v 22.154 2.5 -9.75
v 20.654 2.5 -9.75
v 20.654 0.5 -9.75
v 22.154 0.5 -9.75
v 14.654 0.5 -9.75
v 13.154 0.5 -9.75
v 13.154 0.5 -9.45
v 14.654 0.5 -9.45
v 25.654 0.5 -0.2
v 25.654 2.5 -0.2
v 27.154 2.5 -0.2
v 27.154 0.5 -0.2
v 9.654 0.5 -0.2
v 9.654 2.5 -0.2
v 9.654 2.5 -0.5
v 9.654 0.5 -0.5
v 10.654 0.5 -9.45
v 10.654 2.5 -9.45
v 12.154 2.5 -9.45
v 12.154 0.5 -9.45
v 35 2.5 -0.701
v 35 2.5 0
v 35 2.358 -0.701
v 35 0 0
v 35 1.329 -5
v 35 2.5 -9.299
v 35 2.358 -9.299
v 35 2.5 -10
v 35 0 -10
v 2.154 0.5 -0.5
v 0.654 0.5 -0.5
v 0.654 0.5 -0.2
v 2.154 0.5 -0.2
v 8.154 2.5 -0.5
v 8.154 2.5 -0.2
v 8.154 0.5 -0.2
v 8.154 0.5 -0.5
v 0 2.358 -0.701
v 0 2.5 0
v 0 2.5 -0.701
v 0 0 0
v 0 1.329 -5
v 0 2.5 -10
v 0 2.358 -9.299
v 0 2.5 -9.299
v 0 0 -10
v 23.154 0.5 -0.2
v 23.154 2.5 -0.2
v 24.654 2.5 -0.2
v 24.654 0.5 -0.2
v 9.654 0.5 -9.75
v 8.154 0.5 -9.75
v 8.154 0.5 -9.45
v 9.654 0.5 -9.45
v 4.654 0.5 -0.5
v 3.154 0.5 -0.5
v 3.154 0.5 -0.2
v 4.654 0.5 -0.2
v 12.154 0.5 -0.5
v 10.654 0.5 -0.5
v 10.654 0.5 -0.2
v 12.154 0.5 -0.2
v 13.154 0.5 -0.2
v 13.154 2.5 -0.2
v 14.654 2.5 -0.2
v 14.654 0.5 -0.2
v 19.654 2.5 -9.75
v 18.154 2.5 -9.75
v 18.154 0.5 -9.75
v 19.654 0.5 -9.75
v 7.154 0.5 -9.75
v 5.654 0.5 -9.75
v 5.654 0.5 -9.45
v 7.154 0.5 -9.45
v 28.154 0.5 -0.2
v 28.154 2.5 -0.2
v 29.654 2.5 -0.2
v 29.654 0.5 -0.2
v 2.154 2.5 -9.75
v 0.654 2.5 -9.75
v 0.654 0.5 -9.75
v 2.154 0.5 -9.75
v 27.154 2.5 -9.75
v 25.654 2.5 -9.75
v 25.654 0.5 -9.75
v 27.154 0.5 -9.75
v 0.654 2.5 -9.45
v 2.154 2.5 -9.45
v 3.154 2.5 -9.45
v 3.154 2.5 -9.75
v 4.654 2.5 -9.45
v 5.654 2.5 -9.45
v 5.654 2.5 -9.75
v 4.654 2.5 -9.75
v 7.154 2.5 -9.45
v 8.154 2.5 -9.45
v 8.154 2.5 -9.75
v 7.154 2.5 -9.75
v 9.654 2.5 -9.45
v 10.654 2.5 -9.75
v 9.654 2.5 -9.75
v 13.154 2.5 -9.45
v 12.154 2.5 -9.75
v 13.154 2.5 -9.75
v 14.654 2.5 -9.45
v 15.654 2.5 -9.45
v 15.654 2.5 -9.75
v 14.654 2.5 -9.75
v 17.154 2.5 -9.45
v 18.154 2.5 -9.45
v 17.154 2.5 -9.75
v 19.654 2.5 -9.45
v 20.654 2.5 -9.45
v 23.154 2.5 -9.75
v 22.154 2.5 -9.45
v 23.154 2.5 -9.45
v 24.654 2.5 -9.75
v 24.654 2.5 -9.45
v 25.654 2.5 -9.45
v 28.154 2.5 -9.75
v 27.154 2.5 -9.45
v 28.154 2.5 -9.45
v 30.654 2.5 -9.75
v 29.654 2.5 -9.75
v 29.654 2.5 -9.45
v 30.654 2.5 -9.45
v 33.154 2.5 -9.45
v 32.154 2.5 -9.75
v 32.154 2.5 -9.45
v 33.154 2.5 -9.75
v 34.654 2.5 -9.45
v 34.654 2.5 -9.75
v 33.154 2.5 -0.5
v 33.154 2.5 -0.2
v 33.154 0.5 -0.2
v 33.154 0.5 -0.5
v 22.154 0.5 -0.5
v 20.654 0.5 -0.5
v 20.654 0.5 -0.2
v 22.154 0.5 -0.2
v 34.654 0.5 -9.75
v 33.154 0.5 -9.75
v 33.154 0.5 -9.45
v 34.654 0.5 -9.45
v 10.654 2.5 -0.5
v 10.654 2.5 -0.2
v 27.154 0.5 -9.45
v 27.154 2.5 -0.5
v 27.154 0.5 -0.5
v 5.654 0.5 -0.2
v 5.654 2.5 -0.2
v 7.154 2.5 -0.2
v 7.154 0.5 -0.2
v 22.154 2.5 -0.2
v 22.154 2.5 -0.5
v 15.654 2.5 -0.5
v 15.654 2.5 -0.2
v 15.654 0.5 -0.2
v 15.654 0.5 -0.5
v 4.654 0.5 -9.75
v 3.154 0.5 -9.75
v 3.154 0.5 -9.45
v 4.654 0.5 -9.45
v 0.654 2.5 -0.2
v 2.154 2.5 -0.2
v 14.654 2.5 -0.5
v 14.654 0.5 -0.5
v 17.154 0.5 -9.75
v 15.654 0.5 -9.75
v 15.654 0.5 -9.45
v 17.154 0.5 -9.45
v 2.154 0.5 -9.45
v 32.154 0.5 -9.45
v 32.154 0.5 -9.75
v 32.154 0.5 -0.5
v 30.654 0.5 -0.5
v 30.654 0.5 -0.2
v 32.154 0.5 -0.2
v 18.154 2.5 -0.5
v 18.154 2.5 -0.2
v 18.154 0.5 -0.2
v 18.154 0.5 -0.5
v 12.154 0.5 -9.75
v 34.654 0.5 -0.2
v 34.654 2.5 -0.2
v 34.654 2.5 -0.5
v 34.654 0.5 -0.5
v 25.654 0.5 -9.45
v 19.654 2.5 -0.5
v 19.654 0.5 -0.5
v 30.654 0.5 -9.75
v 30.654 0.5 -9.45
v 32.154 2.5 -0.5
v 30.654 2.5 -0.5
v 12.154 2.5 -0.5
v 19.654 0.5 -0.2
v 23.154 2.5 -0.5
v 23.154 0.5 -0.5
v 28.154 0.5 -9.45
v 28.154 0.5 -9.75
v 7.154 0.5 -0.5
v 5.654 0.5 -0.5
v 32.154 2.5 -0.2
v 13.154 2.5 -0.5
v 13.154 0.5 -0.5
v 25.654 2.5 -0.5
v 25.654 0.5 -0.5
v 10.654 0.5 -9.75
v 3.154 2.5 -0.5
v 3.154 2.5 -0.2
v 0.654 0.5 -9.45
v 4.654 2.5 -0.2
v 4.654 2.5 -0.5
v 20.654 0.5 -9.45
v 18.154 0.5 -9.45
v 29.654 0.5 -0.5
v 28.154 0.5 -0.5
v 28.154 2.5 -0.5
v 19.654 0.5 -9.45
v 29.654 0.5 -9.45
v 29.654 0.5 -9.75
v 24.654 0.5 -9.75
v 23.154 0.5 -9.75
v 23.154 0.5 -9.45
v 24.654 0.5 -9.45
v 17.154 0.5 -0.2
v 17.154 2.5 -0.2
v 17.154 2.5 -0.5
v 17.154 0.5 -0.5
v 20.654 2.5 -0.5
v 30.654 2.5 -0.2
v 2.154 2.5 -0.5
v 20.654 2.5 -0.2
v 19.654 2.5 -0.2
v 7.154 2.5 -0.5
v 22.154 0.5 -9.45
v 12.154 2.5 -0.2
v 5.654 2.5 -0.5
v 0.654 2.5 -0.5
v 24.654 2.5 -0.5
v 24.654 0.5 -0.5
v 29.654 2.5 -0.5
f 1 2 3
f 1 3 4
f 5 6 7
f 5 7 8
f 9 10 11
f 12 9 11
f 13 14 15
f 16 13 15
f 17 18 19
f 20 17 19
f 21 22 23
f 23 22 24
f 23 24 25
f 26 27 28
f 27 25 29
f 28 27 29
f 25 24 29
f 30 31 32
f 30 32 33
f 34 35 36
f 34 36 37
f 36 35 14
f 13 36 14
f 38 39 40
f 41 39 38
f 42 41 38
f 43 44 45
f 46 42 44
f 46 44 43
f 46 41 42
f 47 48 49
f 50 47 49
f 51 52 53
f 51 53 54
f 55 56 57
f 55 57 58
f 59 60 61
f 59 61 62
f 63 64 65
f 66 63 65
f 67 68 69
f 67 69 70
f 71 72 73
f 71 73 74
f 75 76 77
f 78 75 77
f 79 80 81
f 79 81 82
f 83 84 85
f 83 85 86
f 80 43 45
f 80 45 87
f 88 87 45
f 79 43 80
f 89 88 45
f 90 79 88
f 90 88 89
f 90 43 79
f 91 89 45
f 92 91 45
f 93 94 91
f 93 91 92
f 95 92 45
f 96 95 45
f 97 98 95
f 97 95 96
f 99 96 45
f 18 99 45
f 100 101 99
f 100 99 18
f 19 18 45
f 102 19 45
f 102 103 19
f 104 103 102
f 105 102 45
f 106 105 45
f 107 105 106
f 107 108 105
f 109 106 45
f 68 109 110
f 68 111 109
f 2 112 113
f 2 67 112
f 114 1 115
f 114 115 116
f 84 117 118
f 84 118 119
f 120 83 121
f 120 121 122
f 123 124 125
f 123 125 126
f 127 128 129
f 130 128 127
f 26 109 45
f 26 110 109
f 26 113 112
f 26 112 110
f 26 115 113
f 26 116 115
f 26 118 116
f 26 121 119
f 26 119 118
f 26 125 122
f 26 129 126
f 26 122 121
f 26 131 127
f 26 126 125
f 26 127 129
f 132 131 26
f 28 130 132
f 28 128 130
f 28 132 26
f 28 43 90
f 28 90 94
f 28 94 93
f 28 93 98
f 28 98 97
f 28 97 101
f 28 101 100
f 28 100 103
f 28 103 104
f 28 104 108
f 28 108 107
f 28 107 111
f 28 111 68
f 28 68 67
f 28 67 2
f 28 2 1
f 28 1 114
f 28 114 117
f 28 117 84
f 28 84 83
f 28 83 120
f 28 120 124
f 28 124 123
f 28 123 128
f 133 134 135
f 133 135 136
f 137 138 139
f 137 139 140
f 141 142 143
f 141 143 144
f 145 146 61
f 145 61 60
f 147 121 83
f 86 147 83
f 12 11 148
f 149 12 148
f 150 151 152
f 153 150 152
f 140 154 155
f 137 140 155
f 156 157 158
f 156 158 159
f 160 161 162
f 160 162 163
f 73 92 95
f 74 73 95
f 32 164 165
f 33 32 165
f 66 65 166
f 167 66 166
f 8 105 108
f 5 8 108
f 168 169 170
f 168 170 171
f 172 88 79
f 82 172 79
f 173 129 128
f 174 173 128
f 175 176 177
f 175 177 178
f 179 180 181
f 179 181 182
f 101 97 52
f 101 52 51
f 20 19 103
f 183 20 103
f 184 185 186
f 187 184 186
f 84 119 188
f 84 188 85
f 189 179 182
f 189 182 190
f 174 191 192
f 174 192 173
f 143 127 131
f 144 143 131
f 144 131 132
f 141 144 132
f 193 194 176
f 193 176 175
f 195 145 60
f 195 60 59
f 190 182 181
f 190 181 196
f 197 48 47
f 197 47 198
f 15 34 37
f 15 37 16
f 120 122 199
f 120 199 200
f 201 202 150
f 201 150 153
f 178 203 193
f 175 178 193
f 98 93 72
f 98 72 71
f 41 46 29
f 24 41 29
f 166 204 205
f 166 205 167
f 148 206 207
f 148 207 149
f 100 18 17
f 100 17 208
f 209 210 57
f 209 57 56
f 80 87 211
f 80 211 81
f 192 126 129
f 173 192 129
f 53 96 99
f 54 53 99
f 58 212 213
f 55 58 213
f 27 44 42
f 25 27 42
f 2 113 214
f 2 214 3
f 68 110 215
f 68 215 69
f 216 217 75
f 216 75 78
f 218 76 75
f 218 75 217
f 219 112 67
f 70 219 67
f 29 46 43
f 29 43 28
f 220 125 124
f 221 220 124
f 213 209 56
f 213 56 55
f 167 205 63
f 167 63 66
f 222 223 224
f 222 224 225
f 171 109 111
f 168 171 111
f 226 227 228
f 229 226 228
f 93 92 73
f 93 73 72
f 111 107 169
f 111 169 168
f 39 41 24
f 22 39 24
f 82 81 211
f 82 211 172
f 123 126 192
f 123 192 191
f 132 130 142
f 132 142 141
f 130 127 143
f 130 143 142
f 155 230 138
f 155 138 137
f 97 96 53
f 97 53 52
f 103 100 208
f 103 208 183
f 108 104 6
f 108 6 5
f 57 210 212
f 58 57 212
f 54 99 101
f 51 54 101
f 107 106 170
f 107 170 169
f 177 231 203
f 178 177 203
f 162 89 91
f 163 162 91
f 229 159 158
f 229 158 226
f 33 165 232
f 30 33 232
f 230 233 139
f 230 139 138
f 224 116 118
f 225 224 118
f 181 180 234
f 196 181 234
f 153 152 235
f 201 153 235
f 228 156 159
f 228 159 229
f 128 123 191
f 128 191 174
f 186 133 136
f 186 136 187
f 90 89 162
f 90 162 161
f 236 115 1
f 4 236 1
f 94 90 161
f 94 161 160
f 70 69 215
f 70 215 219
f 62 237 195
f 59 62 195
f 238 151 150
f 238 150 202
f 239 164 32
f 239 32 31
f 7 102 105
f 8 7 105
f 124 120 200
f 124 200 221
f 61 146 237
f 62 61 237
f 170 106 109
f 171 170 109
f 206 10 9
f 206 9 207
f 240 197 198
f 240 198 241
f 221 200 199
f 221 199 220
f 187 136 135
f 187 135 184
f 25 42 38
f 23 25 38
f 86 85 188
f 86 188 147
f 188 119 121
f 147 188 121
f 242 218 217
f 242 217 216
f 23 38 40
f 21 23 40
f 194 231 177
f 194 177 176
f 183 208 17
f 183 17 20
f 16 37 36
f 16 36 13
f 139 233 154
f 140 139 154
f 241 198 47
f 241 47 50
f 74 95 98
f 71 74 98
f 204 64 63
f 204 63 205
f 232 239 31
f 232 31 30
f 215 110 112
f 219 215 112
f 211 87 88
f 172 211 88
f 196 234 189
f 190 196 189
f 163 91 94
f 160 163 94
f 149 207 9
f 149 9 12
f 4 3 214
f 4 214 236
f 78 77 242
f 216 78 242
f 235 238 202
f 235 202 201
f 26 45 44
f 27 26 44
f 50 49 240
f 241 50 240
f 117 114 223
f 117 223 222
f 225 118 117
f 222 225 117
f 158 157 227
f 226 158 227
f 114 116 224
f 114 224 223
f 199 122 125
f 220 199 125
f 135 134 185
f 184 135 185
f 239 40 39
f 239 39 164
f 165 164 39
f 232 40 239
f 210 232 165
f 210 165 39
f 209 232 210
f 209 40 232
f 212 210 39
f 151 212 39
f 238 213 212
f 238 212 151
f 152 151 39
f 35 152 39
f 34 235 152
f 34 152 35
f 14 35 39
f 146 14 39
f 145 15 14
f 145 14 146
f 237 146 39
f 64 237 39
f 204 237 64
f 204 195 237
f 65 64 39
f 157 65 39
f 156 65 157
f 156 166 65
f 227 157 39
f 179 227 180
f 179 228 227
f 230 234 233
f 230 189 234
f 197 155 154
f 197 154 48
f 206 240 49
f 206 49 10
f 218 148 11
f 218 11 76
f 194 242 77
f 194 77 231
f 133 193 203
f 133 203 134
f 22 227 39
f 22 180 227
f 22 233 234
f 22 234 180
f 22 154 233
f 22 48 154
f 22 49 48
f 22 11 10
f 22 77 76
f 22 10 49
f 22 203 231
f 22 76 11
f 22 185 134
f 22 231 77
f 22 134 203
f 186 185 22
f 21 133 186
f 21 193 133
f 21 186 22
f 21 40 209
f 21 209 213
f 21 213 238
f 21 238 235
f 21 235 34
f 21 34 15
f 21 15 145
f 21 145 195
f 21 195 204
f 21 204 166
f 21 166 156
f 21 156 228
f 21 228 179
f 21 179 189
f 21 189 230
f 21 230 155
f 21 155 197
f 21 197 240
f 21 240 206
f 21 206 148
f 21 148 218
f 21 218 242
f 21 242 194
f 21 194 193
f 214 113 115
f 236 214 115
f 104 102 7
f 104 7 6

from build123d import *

# Parameters (mm, degrees)
SKETCH1_W            = 35
SKETCH1_H            = 10
BOSS_EXTRUDE1_DEPTH  = 2.5
SKETCH2_W            = 1.5
SKETCH2_H            = 0.3
CUT_EXTRUDE1_DEPTH   = 2
LPATTERN1_COUNT      = 14
LPATTERN1_PITCH      = 2.5
LPATTERN1_COUNT_DIR2 = 2
LPATTERN1_PITCH_DIR2 = 9.25
CUT_EXTRUDE2_DEPTH   = 37.486298798
CUT_EXTRUDE3_DEPTH   = 37.486298798


with BuildPart() as part:
    # Sketch1 → Boss-Extrude1 (new body)
    with BuildSketch(Plane(origin=(0, 0, 0), x_dir=(1, 0, 0), z_dir=(0, 1, 0))):
        with Locations((17.5, 5)):
            Rectangle(SKETCH1_W, SKETCH1_H)
    extrude(amount=BOSS_EXTRUDE1_DEPTH)

    # Sketch2 → Cut-Extrude1 (cut)
    with BuildSketch(Plane(origin=(0, 2.5, 0), x_dir=(1, 0, 0), z_dir=(0, 1, 0))):
        with Locations((1.404, 0.35)):
            Rectangle(SKETCH2_W, SKETCH2_H)
    cut_extrude1 = extrude(amount=-CUT_EXTRUDE1_DEPTH, mode=Mode.SUBTRACT)

    # LPattern1: Cut-Extrude1 14 × 2
    with Locations(*[(i * LPATTERN1_PITCH, 0, -j * LPATTERN1_PITCH_DIR2) for i in range(LPATTERN1_COUNT) for j in range(LPATTERN1_COUNT_DIR2) if (i, j) != (0, 0)]):
        add(cut_extrude1, mode=Mode.SUBTRACT)

    # Sketch3 → Cut-Extrude2 (cut, through all)
    with BuildSketch(Plane.ZY):
        Polygon((-0.701017802, 2.5), (-5, 2.5), (-5, 1.329177264), (-0.701017802, 2.35798372), align=None)
    extrude(amount=-CUT_EXTRUDE2_DEPTH, mode=Mode.SUBTRACT)

    # Sketch3<3> → Cut-Extrude3 (cut, through all)
    with BuildSketch(Plane.ZY):
        Polygon((-5, 2.5), (-9.298982198, 2.5), (-9.298982198, 2.35798372), (-5, 1.329177264), align=None)
    extrude(amount=-CUT_EXTRUDE3_DEPTH, mode=Mode.SUBTRACT)


solid = part.part
